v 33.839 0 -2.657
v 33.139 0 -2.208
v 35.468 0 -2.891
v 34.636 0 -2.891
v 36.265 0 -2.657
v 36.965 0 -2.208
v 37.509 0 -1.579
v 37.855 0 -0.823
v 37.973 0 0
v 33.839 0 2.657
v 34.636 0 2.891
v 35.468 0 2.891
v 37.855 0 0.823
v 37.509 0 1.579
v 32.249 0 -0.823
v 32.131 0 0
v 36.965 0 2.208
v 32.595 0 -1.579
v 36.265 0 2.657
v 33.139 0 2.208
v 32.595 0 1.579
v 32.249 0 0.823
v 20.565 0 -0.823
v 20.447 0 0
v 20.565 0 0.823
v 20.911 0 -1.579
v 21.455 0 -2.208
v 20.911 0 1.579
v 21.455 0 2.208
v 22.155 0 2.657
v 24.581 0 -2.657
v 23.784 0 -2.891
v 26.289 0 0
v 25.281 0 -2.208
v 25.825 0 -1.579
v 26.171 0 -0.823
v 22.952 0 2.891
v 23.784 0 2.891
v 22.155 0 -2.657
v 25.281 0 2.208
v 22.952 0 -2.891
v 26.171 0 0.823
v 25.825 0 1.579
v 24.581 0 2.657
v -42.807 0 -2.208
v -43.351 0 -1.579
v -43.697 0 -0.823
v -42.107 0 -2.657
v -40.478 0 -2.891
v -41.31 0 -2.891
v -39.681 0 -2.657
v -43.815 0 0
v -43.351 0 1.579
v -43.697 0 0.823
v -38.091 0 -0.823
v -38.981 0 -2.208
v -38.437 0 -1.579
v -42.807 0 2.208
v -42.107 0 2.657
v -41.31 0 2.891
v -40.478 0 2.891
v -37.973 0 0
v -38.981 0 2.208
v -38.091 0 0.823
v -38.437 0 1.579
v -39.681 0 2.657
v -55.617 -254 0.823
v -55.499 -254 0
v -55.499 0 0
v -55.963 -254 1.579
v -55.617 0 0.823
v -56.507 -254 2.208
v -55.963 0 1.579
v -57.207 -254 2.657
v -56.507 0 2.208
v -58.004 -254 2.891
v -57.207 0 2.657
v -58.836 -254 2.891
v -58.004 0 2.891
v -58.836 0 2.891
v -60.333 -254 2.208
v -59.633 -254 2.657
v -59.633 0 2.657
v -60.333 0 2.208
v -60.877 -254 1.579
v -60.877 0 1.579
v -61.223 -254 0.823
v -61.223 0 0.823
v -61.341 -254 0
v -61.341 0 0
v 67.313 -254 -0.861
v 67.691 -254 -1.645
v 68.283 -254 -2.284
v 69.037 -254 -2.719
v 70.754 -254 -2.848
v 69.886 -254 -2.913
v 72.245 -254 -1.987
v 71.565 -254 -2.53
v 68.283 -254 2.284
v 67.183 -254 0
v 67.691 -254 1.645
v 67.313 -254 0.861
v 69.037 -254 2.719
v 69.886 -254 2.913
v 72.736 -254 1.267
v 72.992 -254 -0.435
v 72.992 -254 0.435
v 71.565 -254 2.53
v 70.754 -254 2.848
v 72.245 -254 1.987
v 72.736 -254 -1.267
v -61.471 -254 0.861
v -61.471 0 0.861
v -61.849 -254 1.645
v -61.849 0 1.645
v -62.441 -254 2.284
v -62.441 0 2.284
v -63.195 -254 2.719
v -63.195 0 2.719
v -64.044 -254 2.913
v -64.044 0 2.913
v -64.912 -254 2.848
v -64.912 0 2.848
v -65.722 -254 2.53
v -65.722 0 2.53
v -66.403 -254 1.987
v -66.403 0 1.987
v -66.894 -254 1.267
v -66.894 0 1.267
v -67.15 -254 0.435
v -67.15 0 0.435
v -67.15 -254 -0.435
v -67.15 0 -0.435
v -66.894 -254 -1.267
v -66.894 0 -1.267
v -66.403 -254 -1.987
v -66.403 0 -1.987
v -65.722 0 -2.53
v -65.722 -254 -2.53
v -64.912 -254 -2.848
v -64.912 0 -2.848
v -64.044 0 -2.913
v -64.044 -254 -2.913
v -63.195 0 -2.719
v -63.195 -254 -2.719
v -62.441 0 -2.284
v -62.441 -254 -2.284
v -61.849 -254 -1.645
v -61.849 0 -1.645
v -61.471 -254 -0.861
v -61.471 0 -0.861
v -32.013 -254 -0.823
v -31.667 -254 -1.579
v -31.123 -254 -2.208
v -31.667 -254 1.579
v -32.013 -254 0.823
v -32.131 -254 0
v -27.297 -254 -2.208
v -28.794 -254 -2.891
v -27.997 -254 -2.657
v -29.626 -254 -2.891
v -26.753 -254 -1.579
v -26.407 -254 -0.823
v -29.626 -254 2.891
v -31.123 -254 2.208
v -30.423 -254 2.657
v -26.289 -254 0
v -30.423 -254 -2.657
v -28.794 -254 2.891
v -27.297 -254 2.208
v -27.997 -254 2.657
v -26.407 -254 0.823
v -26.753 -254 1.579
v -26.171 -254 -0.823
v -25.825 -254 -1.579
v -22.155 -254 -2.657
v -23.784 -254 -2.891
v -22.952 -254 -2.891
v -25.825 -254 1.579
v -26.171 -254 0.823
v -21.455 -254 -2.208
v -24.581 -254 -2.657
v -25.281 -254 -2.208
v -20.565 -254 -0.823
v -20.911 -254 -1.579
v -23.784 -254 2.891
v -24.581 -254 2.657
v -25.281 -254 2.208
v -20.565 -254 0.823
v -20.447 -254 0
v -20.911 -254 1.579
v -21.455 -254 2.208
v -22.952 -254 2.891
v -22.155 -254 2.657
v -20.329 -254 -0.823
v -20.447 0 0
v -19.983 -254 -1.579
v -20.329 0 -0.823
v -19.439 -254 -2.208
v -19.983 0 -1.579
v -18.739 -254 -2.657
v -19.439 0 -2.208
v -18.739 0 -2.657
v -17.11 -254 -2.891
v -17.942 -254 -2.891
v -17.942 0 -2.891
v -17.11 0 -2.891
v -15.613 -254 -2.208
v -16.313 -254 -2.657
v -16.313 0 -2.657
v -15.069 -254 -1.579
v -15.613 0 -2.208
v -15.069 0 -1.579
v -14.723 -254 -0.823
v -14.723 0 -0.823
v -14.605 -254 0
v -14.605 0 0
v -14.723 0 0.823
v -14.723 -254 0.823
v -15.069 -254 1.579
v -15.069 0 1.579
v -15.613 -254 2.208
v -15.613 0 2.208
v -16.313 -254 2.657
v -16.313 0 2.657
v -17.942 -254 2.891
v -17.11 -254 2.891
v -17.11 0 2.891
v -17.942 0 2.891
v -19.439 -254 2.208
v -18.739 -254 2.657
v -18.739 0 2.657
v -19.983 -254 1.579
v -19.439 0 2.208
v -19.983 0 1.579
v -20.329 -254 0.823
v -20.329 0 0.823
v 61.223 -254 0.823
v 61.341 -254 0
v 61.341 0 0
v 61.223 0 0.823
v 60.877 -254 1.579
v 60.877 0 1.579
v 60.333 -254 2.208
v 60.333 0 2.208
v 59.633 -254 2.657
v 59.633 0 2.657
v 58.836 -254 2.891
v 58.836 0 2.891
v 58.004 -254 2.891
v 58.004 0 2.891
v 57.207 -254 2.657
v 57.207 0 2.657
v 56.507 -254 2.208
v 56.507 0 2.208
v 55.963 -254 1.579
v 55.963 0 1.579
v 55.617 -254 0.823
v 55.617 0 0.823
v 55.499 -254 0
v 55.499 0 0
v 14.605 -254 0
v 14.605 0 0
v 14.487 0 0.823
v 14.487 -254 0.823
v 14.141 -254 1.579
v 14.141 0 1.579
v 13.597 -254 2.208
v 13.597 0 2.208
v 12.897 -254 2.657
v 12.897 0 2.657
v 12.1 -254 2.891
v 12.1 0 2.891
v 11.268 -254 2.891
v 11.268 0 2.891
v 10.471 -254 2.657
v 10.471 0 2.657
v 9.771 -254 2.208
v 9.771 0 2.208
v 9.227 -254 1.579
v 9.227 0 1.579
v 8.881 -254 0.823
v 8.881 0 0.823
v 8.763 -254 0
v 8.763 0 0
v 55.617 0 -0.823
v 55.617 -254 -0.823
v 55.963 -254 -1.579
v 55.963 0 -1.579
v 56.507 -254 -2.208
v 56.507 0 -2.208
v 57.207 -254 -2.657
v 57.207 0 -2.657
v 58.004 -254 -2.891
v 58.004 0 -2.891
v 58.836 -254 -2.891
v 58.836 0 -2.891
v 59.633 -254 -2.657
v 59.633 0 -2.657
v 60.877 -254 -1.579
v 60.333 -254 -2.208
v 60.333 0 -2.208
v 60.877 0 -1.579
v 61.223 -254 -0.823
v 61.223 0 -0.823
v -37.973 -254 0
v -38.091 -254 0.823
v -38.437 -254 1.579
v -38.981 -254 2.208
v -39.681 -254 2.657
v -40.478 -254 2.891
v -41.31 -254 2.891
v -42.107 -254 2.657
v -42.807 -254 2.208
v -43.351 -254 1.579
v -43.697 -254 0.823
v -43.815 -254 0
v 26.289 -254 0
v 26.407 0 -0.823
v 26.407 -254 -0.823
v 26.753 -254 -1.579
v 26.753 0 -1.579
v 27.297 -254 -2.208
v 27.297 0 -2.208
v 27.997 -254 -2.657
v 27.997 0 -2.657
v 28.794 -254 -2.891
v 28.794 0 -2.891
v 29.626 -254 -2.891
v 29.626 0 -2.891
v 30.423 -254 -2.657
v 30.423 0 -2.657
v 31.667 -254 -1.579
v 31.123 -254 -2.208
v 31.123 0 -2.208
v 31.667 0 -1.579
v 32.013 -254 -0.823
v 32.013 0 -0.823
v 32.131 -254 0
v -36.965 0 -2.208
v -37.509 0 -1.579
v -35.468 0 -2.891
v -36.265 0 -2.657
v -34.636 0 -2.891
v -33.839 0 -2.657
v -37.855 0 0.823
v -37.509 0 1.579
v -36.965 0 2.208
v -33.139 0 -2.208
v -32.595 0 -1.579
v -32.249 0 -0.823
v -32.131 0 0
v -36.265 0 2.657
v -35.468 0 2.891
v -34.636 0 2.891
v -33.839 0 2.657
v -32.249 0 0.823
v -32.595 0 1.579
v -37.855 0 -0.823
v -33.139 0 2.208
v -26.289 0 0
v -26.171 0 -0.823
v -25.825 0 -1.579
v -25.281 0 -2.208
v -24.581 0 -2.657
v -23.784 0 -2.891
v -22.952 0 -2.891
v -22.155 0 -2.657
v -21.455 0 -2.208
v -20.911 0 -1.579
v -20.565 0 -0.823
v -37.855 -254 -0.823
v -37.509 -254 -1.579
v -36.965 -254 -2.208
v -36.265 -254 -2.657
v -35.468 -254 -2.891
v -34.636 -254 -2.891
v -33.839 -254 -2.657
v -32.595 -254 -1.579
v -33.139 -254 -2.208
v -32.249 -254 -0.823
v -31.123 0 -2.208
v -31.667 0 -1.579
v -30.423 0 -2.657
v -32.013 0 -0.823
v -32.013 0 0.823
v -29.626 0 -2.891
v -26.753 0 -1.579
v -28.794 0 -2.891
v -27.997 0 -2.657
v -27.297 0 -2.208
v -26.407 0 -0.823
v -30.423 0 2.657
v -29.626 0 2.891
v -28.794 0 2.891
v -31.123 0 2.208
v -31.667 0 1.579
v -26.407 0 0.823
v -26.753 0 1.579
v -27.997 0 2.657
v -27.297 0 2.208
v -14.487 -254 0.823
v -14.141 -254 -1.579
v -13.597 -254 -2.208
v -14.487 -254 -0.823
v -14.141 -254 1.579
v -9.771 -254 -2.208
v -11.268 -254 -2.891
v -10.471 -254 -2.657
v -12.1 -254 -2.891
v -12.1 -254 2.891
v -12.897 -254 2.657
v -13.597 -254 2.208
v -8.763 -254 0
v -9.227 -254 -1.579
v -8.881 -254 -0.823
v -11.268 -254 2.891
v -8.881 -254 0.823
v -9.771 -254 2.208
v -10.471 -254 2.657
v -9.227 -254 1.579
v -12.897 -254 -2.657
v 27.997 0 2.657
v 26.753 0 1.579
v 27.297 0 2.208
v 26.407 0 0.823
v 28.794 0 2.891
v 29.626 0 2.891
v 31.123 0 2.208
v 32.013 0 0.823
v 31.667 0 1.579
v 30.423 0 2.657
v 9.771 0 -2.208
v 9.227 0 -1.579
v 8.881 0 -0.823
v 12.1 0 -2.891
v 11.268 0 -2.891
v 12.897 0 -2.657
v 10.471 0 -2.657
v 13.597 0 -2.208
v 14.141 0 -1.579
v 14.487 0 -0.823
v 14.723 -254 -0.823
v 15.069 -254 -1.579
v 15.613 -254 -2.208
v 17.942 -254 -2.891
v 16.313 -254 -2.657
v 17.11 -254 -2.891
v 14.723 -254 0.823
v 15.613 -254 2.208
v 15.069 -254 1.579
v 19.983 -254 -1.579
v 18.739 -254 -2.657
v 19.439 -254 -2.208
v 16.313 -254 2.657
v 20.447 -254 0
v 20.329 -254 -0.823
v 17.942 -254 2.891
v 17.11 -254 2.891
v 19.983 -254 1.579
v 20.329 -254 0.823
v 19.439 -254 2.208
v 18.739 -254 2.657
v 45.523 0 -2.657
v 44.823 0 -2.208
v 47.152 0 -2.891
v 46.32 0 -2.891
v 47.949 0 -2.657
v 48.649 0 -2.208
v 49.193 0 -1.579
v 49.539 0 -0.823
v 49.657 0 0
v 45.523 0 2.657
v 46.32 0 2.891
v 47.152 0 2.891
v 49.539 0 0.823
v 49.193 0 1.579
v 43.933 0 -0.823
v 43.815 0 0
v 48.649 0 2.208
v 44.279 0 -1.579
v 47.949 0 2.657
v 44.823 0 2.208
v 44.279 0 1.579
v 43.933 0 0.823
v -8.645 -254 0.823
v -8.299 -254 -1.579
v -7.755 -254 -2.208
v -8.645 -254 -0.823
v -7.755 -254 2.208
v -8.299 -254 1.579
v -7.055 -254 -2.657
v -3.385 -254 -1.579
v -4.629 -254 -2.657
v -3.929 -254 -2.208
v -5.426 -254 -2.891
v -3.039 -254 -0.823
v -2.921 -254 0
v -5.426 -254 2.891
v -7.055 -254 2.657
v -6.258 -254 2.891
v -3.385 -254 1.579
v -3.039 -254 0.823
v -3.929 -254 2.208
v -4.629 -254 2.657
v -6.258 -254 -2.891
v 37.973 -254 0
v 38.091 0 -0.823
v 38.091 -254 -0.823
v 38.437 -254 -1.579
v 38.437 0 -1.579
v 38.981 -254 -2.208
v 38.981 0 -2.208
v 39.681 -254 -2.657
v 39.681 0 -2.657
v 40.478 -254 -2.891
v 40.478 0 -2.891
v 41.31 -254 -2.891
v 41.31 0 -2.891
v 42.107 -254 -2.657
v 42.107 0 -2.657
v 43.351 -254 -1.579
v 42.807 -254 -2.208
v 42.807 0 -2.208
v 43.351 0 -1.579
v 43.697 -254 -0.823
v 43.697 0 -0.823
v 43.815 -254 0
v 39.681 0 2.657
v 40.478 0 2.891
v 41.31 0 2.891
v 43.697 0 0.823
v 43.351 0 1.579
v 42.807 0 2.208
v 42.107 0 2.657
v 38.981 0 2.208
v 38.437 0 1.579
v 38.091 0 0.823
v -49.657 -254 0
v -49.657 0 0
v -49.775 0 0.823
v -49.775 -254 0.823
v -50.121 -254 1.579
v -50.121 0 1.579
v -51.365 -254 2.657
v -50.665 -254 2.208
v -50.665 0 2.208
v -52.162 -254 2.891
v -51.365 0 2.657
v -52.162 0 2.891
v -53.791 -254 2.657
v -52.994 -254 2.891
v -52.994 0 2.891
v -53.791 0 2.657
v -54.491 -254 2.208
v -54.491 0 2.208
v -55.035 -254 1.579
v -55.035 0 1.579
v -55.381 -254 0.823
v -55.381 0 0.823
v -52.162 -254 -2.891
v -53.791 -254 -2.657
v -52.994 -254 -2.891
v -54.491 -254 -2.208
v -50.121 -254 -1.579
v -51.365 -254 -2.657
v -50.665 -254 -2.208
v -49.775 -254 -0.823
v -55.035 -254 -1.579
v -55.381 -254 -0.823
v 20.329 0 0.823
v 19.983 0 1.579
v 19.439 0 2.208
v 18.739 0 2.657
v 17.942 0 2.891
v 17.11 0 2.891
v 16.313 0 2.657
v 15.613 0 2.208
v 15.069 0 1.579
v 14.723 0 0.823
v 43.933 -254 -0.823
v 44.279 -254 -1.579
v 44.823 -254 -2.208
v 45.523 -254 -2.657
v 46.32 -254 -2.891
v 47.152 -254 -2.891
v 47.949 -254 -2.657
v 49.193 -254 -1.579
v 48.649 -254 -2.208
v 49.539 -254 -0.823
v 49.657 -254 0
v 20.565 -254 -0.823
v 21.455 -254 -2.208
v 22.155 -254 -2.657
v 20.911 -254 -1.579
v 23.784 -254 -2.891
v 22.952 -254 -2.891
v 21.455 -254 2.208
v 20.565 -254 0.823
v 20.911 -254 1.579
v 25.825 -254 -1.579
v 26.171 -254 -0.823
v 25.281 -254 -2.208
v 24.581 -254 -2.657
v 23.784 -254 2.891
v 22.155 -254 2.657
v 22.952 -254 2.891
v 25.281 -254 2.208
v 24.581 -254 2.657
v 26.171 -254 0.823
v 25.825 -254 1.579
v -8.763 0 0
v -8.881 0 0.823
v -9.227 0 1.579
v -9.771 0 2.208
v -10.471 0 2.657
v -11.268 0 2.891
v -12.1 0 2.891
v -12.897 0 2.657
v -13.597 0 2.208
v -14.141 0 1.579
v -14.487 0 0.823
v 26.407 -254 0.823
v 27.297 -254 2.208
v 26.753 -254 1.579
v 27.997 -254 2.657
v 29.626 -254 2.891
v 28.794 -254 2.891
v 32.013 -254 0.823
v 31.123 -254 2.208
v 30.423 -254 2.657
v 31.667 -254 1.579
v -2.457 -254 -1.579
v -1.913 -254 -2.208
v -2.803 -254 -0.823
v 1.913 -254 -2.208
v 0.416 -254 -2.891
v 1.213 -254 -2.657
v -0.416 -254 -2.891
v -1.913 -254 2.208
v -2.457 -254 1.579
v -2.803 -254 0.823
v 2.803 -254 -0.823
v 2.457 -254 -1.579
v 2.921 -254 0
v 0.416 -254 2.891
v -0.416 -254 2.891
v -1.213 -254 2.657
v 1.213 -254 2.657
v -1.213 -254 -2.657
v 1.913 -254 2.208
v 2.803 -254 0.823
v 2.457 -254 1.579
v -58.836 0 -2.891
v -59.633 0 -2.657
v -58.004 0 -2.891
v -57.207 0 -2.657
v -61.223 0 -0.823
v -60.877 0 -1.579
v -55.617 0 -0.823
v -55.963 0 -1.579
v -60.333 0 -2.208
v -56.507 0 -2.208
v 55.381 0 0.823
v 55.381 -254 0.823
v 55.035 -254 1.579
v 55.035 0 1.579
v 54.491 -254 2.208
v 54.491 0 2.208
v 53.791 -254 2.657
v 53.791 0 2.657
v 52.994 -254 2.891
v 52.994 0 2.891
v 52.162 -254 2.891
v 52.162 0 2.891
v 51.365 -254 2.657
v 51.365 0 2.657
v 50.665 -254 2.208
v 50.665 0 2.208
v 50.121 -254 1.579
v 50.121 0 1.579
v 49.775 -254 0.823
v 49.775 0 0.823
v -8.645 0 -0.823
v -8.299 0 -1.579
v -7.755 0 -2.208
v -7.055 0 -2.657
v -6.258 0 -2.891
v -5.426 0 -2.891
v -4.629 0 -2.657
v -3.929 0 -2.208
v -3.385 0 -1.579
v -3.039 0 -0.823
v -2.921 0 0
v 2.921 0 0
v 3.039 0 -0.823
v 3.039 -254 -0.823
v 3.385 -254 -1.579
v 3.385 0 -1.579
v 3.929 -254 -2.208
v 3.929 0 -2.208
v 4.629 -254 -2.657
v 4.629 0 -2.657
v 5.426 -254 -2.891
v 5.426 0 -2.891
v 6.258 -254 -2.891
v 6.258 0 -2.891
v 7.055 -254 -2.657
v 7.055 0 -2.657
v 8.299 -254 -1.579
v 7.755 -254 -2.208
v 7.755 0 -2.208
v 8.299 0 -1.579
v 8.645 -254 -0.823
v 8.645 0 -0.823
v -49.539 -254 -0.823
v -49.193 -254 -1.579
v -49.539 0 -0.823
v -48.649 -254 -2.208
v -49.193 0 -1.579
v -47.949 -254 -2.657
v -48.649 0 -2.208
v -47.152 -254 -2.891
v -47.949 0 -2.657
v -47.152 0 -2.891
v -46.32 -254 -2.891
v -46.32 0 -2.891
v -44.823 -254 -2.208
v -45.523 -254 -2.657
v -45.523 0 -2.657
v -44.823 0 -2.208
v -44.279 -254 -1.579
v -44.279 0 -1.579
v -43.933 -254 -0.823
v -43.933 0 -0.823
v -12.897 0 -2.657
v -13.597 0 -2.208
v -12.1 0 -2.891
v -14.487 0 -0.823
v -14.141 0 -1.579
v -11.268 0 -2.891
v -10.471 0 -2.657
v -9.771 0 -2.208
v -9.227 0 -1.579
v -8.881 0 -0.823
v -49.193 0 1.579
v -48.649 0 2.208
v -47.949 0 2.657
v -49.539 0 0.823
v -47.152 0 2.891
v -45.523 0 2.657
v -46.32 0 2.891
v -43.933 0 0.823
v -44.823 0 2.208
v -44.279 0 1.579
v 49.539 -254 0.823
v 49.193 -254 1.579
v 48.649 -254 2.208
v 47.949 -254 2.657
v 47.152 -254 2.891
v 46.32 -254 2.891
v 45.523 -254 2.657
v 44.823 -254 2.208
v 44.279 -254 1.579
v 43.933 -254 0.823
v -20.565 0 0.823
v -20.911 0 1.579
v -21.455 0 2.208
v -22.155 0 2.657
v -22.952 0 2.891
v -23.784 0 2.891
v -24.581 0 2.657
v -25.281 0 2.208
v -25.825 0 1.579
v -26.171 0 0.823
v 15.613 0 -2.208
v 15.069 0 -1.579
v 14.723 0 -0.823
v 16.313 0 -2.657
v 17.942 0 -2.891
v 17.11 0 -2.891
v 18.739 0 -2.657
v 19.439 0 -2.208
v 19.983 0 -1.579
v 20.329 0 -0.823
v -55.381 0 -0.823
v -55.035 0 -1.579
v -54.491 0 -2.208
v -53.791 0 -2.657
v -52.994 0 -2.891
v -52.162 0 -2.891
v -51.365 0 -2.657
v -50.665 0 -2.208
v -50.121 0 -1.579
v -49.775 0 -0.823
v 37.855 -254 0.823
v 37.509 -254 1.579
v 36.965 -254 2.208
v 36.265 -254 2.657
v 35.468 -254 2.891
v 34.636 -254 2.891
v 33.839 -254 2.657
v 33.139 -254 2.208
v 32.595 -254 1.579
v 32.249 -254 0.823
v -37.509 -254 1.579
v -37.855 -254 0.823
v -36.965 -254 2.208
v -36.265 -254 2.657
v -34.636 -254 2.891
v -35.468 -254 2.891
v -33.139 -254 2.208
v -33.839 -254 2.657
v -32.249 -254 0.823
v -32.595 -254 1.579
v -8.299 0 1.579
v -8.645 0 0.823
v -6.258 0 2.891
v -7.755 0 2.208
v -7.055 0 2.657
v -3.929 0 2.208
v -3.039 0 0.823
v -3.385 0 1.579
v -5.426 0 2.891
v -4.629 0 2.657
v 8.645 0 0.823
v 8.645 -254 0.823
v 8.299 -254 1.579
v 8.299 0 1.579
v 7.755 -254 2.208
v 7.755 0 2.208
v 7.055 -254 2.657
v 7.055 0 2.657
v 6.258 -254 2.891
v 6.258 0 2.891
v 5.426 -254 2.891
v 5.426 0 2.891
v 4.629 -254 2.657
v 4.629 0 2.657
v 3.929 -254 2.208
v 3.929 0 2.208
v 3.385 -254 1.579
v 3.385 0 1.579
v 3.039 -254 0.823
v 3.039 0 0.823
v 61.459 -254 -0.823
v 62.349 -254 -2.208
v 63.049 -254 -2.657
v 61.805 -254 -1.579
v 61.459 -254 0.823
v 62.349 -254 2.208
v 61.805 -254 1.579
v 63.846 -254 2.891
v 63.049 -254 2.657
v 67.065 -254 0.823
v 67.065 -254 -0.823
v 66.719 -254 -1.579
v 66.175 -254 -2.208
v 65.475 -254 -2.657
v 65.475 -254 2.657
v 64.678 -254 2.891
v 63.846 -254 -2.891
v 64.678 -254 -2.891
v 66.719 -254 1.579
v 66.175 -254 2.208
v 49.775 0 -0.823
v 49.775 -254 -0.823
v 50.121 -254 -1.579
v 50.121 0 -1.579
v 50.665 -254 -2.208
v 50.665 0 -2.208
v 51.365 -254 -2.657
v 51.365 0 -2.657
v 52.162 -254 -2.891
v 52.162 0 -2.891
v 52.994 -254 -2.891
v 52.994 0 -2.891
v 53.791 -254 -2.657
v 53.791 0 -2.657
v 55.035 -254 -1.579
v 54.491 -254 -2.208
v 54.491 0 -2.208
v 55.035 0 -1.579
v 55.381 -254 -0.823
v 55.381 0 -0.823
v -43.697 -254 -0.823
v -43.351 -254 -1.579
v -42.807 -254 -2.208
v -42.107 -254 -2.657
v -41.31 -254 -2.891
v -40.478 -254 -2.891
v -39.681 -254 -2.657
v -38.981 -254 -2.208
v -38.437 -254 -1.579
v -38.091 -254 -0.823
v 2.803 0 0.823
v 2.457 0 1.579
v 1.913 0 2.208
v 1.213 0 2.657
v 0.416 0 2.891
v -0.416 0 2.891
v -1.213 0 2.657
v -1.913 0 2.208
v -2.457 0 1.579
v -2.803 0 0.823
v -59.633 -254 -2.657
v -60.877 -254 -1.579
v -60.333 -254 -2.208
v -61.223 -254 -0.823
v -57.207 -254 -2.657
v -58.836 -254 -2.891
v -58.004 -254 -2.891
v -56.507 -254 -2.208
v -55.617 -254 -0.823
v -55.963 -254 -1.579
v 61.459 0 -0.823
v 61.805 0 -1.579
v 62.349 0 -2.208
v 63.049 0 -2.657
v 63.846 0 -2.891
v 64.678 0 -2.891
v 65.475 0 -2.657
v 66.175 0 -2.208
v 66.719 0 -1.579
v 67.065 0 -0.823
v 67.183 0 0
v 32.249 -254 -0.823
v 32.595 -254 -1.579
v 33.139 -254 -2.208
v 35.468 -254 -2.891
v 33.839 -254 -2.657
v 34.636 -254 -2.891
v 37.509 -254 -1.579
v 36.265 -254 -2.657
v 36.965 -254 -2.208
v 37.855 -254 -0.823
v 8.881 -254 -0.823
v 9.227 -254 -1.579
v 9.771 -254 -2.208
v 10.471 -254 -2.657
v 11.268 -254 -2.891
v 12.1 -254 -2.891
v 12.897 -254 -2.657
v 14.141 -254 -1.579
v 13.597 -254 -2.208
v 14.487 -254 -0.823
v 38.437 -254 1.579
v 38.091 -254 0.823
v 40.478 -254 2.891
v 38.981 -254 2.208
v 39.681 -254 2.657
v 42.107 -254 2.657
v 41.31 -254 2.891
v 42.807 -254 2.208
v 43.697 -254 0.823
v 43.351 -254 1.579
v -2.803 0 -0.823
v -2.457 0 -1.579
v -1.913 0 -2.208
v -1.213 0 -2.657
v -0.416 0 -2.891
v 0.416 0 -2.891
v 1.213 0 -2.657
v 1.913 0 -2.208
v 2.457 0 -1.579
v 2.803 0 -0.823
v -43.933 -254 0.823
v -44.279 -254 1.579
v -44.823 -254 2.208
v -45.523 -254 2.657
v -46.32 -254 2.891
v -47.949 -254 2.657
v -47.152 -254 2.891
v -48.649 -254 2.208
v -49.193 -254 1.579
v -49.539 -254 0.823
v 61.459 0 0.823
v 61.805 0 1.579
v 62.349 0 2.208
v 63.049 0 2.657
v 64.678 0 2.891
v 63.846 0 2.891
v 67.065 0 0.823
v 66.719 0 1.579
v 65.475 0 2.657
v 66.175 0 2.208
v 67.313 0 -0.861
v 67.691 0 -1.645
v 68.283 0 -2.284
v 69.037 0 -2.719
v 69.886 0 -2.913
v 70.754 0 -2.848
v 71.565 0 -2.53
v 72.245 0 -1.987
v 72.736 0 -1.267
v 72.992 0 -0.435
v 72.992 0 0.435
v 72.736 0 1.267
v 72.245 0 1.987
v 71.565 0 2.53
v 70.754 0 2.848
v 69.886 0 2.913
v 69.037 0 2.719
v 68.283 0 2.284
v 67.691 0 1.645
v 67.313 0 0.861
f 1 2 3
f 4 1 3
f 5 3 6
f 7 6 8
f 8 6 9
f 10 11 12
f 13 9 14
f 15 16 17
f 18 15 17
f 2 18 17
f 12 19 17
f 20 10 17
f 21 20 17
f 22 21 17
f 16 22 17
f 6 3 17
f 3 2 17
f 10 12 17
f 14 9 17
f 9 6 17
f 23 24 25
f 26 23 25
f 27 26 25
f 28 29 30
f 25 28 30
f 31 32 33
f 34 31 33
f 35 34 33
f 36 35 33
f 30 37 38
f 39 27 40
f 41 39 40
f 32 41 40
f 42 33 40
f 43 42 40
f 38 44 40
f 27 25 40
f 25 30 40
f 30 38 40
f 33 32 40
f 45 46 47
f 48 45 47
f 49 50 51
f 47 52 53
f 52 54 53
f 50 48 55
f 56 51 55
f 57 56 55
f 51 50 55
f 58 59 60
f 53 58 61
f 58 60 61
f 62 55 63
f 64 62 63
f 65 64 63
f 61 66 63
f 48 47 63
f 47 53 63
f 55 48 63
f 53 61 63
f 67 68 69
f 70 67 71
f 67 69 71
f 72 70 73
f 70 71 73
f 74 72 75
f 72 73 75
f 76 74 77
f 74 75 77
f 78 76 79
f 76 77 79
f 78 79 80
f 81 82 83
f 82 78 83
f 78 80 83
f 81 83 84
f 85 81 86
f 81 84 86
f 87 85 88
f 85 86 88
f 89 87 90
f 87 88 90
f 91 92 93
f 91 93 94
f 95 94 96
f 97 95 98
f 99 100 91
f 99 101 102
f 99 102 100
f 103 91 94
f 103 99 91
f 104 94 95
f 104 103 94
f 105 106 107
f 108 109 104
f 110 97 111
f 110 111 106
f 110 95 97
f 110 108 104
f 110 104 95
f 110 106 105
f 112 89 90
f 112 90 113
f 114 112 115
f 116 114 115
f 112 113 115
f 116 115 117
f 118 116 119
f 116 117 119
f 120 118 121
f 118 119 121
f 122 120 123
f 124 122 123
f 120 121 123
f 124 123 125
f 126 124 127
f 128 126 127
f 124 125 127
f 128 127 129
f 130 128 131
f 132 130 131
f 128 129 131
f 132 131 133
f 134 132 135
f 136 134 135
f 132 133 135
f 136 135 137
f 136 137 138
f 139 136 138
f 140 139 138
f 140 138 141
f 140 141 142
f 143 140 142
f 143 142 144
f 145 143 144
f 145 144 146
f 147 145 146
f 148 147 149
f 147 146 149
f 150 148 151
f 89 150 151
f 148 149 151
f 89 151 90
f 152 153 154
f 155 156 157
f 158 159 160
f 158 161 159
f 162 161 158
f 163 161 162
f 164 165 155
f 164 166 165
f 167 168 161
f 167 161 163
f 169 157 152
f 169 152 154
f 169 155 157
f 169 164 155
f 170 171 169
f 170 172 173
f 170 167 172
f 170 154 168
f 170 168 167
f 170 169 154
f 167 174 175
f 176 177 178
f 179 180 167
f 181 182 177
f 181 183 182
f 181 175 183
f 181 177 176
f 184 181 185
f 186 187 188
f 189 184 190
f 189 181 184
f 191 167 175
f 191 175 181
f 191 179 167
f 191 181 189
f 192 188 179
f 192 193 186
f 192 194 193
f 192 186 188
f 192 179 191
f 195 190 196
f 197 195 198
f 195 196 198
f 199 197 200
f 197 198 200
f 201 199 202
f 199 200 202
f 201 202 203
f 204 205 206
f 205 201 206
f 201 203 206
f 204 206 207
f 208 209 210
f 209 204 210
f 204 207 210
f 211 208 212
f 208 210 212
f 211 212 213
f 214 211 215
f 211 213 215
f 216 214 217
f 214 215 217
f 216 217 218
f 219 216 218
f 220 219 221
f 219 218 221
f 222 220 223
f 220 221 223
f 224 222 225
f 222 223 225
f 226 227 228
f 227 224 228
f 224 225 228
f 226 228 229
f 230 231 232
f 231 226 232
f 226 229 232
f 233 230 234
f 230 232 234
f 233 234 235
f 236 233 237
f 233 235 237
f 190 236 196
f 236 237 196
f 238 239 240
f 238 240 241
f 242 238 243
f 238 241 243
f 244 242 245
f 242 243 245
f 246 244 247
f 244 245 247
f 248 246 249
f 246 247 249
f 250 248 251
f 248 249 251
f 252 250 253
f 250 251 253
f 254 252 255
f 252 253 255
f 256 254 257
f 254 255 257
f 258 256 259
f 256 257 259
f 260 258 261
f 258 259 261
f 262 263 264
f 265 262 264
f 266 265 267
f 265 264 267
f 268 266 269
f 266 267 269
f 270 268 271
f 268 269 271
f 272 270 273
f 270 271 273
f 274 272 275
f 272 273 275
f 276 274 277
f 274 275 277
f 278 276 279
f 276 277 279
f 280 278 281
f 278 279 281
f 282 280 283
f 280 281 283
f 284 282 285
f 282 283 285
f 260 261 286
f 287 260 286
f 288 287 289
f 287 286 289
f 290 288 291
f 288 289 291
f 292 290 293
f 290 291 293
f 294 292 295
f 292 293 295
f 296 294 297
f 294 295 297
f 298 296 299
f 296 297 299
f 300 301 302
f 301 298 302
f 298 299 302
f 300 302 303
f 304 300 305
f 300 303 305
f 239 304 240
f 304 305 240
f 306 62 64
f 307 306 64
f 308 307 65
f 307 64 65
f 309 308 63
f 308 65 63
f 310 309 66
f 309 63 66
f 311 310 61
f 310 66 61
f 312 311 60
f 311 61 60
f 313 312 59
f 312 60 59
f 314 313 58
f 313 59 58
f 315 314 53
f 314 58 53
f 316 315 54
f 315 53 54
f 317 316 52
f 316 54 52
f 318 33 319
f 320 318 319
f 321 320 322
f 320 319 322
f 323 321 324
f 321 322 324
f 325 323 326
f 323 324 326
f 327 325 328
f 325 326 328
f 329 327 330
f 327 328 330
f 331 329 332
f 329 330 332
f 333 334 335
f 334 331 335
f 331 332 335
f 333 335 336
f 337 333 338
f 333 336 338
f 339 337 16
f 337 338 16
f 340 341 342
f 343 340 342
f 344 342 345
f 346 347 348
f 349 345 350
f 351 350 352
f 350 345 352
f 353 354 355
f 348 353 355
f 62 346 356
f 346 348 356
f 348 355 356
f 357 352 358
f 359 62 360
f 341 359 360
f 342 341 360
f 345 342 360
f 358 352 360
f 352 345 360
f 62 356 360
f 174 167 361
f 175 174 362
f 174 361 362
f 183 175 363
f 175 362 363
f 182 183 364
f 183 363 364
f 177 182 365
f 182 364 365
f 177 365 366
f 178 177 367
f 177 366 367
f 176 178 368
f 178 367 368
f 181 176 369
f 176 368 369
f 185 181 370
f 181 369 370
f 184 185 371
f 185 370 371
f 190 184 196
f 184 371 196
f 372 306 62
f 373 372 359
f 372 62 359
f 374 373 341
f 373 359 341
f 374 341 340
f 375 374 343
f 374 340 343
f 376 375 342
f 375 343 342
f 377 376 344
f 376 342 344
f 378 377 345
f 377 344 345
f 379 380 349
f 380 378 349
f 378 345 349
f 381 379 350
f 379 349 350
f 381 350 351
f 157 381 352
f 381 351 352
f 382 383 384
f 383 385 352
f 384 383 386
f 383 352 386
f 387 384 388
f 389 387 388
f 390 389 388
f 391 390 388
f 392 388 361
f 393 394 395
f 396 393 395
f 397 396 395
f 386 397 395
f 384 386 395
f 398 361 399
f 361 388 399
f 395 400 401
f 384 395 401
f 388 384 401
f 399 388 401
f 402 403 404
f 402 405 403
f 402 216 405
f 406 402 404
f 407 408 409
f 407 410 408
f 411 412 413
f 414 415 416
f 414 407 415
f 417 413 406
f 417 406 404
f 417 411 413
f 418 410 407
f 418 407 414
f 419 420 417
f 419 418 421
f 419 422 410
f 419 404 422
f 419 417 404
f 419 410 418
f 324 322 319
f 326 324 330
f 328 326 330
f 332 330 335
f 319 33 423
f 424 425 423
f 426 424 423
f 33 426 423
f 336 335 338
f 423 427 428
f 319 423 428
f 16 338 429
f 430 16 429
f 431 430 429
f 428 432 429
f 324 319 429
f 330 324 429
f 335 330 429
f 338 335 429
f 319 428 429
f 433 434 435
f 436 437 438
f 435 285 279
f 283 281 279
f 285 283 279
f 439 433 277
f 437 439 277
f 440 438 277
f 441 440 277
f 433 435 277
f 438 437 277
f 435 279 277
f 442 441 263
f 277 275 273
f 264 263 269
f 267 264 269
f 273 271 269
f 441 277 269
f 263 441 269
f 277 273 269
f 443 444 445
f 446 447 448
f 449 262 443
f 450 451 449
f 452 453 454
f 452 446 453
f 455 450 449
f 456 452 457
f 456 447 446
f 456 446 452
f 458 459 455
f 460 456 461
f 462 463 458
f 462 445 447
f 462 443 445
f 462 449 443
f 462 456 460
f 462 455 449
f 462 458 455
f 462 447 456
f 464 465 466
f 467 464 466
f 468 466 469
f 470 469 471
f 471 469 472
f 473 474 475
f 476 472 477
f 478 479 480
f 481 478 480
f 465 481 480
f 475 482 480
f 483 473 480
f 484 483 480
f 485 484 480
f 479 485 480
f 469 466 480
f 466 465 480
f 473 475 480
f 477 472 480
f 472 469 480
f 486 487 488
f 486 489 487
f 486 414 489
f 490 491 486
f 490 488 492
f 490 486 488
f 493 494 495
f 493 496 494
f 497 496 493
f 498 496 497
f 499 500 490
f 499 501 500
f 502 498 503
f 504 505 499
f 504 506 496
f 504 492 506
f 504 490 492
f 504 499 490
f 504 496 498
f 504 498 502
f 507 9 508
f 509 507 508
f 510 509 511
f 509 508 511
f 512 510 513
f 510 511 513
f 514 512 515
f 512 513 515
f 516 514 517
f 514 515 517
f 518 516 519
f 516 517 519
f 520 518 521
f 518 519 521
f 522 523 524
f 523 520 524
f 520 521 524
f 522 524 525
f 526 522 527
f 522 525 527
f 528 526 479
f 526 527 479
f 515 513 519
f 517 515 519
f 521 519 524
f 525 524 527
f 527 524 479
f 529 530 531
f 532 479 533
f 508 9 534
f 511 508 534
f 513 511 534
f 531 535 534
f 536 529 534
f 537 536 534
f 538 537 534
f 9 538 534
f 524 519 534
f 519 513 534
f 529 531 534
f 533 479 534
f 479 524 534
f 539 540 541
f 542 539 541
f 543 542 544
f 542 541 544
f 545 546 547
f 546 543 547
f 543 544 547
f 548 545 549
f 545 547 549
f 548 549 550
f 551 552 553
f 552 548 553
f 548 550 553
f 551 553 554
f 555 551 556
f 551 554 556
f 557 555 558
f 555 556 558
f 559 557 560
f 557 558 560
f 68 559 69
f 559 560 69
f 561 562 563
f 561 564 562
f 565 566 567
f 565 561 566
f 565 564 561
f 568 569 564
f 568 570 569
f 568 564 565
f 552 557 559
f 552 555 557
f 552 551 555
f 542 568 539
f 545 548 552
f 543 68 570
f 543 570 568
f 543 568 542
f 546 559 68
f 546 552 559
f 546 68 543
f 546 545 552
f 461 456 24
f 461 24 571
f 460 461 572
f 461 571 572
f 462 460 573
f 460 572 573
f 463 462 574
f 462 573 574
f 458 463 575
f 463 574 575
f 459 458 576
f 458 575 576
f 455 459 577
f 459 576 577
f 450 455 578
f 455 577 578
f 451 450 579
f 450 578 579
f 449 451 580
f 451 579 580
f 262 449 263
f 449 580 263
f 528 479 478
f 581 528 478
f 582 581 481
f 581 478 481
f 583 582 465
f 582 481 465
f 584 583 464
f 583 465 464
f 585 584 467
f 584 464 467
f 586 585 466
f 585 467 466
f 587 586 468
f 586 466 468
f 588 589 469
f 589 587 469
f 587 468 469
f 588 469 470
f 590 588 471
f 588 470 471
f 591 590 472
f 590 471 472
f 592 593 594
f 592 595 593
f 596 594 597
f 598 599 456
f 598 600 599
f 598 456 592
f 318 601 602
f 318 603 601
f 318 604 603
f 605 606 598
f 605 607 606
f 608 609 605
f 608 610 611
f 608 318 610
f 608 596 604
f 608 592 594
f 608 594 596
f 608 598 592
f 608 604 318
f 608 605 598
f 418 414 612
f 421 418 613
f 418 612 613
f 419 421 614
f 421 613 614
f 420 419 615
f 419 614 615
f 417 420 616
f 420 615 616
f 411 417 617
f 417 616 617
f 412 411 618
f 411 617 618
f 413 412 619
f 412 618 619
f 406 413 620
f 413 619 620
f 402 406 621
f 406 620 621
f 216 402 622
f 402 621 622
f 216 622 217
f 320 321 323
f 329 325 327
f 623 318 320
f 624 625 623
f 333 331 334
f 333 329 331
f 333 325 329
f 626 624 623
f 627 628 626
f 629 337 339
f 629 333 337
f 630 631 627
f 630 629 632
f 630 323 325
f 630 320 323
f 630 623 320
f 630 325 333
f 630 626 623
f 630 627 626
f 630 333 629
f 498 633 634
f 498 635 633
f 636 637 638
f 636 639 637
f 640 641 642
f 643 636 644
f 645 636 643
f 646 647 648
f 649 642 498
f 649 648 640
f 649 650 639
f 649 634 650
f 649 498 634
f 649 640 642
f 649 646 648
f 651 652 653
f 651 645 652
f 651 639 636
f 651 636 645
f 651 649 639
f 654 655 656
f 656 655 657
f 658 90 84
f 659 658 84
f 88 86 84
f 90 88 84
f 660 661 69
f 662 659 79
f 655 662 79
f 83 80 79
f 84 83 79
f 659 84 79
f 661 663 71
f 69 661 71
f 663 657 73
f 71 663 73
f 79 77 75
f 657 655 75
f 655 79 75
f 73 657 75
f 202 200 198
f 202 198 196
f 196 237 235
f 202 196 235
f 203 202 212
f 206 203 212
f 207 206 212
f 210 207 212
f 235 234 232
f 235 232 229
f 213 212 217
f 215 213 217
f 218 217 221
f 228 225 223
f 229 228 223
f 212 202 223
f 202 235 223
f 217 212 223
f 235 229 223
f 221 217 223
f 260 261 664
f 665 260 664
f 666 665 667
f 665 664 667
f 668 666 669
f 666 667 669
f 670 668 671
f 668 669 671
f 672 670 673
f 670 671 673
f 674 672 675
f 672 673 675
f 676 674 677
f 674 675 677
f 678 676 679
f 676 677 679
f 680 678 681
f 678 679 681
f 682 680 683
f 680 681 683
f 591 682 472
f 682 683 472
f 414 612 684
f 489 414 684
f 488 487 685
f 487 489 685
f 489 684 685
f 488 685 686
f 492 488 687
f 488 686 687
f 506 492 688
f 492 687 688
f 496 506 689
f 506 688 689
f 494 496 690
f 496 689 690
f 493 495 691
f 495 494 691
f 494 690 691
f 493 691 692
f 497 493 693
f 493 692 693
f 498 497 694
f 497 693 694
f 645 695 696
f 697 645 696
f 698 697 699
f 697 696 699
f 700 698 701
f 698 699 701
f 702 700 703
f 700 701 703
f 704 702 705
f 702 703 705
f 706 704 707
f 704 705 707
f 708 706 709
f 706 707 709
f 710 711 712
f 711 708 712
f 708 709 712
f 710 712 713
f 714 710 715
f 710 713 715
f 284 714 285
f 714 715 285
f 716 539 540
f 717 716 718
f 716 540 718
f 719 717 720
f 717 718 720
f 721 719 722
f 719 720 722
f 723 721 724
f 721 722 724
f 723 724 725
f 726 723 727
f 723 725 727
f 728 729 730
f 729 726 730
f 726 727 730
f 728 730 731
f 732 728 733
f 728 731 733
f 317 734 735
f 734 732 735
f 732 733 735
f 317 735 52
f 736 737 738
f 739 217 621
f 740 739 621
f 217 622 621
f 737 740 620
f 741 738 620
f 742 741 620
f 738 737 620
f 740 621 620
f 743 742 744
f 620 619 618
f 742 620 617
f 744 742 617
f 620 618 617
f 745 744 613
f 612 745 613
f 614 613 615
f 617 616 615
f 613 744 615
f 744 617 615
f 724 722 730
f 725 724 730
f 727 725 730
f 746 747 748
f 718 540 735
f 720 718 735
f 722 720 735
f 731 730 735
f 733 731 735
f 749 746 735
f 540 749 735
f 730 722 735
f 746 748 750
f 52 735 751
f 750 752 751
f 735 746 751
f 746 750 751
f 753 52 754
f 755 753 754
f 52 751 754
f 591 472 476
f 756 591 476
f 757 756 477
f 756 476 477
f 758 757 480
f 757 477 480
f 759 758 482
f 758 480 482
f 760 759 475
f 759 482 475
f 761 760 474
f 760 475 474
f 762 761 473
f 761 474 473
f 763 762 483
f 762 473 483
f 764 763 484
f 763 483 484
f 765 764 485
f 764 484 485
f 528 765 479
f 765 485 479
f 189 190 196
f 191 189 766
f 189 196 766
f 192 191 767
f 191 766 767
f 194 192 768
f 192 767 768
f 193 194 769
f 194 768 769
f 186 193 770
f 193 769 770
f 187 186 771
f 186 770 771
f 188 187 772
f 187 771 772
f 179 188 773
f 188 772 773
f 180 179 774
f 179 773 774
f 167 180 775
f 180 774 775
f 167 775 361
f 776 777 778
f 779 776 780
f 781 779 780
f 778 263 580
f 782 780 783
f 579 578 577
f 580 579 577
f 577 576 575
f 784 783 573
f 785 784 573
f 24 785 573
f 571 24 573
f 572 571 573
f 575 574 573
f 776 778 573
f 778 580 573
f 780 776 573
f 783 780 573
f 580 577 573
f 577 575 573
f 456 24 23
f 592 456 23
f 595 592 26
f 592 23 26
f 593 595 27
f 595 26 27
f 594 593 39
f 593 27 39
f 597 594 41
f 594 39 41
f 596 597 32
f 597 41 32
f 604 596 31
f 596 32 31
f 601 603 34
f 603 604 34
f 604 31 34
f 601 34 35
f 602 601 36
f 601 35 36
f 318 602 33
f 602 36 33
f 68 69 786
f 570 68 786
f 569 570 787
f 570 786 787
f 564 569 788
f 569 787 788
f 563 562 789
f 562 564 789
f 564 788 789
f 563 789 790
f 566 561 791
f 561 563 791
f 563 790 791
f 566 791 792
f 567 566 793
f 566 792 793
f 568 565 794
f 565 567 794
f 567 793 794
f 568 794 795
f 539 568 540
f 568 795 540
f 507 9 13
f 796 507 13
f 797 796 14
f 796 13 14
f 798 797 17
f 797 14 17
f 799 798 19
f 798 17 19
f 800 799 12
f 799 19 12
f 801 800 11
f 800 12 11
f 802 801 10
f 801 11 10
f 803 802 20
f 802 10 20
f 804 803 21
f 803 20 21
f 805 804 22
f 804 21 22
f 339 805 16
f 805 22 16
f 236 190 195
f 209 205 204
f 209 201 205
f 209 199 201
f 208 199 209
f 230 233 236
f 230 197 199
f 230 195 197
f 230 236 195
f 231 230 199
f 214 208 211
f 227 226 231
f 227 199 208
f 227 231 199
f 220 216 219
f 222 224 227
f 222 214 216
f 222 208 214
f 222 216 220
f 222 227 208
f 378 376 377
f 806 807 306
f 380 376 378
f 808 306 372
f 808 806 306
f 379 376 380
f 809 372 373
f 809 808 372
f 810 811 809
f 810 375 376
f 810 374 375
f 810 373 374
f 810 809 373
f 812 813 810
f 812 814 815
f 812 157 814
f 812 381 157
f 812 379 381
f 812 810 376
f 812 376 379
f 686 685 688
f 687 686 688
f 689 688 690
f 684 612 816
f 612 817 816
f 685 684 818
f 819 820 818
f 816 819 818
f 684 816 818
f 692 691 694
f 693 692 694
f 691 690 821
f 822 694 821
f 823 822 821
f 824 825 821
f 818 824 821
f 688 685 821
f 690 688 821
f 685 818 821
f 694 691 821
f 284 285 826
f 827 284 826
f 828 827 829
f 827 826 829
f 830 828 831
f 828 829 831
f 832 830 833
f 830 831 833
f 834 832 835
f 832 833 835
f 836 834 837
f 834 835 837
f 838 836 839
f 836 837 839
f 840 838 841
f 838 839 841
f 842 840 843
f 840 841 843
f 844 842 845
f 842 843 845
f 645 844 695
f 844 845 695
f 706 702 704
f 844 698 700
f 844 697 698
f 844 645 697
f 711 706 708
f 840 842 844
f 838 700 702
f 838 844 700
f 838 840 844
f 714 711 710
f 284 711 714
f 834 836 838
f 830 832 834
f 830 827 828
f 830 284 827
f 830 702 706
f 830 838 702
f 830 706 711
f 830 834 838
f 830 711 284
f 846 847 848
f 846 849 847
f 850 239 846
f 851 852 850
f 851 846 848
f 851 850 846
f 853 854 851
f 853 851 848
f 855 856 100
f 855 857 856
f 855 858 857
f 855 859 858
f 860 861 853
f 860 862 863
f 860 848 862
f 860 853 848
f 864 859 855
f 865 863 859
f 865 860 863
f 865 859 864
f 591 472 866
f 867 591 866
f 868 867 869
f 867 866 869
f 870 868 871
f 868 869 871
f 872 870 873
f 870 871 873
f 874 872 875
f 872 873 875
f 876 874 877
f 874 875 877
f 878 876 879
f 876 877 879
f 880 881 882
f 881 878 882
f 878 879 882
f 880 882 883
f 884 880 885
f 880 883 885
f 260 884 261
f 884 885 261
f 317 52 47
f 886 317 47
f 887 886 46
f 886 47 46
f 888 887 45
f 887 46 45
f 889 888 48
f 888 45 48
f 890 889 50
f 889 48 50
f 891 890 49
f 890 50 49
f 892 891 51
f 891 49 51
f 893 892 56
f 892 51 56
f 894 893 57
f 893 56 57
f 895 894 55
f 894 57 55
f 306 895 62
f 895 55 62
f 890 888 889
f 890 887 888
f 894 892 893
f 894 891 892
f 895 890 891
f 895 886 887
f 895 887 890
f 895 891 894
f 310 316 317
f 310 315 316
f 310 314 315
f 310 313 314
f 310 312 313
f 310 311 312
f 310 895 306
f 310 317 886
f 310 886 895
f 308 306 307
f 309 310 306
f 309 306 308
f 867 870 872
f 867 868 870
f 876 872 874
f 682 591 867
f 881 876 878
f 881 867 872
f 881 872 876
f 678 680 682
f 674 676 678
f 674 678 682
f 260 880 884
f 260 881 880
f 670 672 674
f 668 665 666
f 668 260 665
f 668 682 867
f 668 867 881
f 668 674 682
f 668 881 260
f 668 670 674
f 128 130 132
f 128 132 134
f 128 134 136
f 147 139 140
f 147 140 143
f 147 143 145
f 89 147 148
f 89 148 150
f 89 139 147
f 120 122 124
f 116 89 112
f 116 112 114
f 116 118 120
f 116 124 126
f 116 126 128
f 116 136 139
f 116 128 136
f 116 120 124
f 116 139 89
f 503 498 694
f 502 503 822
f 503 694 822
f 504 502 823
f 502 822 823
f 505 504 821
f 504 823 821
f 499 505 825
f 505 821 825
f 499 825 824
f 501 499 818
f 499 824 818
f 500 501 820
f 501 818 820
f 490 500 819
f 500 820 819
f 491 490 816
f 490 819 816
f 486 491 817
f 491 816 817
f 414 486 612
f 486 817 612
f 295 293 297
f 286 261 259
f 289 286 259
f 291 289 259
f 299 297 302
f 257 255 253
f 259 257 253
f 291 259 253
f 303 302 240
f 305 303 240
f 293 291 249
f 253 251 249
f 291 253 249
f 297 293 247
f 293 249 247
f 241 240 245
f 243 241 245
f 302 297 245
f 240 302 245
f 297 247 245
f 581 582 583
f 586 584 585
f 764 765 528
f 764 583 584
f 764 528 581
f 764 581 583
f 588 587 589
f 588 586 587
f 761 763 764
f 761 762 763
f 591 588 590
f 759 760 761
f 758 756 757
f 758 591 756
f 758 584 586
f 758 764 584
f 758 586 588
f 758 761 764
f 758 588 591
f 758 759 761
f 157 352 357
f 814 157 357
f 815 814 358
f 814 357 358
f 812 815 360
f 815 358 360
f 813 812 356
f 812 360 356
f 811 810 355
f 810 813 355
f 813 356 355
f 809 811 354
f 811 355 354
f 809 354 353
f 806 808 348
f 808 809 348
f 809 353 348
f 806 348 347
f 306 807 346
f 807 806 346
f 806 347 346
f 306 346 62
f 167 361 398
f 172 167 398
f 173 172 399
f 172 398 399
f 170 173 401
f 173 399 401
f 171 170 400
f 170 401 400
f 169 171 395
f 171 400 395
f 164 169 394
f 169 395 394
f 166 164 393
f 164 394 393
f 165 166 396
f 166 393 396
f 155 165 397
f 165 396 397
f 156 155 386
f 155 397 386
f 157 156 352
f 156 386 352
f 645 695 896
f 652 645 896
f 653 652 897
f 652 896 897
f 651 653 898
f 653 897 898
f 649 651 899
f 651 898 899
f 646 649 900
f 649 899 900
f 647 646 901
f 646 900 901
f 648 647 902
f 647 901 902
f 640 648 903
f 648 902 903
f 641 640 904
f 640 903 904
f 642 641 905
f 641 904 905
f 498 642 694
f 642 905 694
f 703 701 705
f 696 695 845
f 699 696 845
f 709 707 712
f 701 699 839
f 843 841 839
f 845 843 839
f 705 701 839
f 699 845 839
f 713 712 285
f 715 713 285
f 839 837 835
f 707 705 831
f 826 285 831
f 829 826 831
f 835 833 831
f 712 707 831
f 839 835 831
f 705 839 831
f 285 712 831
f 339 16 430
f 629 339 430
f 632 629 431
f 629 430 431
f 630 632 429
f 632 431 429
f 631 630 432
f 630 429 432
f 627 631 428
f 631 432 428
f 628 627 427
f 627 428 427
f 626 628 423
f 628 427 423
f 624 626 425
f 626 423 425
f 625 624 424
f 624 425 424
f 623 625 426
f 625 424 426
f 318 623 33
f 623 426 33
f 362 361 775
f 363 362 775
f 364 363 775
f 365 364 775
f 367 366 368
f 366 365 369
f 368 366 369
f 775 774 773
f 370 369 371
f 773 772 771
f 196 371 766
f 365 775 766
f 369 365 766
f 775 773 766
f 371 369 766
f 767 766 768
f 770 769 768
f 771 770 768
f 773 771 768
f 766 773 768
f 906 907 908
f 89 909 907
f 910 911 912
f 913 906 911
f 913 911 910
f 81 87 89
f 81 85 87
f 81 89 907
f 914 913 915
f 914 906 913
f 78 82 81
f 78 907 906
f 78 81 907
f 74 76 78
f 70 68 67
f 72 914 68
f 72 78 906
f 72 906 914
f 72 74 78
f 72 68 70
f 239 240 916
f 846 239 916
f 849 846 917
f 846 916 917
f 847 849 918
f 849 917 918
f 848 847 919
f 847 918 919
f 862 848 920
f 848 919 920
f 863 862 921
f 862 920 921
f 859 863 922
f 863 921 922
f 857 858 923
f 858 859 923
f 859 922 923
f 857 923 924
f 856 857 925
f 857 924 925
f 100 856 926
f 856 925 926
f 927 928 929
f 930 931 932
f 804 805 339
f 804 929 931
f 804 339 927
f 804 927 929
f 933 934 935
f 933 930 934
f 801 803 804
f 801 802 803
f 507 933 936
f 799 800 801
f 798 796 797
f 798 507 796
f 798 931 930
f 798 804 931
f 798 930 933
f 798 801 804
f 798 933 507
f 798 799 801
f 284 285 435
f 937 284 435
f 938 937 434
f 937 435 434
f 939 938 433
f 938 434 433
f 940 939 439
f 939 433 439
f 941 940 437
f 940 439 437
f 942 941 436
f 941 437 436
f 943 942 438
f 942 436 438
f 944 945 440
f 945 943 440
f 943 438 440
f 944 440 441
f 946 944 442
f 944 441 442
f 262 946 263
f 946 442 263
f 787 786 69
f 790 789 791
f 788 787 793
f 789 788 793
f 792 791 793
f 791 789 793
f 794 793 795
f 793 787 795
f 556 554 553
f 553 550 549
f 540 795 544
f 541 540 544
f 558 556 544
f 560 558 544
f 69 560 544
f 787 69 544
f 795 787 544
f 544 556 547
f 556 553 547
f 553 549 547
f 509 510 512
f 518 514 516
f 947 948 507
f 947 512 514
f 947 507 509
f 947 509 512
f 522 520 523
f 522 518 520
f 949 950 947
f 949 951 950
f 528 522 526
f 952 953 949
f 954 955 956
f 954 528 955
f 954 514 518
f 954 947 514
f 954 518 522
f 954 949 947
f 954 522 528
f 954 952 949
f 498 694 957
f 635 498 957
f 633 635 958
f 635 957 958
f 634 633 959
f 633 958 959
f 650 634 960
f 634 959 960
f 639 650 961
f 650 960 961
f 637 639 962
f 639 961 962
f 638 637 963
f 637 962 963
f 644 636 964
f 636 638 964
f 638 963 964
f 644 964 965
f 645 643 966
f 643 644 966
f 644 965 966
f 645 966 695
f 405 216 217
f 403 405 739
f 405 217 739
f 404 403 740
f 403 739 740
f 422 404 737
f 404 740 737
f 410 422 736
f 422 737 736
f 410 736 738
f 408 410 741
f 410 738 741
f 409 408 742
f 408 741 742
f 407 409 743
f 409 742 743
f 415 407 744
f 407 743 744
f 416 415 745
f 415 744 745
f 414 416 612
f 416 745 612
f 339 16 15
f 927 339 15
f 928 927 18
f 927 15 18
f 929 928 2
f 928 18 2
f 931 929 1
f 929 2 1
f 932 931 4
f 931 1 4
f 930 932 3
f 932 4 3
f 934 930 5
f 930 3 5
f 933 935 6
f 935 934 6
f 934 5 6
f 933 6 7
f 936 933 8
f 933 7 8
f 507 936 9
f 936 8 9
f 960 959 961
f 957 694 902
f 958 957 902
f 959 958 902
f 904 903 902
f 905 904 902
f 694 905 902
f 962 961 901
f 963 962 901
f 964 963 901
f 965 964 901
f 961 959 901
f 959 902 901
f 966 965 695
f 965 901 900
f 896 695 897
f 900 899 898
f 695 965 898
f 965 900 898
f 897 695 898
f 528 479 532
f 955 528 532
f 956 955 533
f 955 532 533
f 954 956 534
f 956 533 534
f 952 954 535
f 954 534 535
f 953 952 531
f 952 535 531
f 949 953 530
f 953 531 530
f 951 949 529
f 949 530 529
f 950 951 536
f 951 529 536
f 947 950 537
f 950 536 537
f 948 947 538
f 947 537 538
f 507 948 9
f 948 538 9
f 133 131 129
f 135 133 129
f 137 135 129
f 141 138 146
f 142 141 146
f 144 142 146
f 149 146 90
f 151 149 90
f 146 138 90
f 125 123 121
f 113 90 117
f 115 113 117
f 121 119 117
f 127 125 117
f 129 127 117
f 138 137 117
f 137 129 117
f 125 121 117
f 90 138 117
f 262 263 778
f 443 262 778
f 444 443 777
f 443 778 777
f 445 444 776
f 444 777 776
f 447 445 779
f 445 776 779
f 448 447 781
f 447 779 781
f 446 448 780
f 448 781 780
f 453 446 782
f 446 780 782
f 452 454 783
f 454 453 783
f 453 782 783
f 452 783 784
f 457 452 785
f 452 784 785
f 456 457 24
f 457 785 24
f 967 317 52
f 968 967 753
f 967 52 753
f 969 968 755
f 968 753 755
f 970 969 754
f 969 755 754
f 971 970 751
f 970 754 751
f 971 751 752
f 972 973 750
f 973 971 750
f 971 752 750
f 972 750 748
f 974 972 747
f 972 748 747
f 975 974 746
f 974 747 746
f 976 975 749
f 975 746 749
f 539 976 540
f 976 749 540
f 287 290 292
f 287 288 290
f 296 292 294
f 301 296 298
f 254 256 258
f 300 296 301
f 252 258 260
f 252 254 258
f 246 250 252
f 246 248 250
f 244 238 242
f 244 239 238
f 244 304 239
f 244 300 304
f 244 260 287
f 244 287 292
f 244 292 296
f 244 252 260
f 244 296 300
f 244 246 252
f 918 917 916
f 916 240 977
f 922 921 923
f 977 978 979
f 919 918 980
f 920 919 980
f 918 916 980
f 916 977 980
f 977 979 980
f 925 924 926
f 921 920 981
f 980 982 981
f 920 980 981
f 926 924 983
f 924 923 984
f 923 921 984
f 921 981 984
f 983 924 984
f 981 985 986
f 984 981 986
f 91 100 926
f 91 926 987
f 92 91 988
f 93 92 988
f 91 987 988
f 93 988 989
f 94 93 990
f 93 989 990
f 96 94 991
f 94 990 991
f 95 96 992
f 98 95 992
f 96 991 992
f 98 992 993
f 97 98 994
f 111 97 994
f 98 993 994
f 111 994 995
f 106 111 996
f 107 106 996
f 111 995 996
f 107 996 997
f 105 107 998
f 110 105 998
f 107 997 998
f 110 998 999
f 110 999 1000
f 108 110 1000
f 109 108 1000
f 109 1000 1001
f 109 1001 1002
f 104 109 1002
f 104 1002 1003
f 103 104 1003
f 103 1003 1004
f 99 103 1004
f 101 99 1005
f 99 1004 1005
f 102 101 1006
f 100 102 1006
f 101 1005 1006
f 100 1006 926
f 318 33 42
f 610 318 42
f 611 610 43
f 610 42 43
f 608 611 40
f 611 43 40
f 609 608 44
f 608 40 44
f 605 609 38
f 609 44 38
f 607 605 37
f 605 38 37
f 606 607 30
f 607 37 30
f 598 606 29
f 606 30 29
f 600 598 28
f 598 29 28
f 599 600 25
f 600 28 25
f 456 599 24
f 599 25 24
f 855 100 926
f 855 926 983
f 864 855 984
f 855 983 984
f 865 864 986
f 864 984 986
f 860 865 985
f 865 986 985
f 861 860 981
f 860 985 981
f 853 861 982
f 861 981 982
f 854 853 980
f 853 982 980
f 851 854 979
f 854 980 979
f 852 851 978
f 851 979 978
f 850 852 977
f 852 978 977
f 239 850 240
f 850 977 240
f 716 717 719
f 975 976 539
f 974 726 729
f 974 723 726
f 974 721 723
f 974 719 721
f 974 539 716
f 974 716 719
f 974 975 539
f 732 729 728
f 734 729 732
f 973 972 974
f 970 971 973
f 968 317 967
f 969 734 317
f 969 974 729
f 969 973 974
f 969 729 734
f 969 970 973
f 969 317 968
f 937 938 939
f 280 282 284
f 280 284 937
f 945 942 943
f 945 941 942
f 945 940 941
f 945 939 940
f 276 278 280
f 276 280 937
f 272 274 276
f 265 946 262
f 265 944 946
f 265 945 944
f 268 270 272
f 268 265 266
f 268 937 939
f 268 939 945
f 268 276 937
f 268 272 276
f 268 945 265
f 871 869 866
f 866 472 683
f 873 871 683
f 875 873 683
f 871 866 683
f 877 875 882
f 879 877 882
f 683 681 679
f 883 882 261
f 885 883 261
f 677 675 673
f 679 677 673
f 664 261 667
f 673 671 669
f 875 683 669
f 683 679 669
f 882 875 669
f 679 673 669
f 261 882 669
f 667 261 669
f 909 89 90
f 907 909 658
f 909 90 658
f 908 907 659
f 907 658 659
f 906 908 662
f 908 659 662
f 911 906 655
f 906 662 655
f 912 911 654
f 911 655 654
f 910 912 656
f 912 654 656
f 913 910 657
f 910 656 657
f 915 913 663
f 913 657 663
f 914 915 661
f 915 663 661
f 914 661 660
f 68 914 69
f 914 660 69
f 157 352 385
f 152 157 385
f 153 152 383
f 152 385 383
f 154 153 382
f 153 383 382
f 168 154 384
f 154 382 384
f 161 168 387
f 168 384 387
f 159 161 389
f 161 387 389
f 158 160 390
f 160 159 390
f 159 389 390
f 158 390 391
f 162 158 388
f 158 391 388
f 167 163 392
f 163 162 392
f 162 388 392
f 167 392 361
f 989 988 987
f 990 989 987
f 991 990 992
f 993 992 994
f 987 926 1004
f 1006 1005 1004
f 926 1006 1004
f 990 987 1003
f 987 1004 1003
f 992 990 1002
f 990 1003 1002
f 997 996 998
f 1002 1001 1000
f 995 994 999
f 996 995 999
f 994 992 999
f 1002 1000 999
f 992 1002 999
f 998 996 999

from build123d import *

# Parameters (mm, degrees)
F0_R     = 2.921
F1_DEPTH = 254


with BuildPart() as f1:
    # F0 (on Front) → F1 (new body)
    with BuildSketch(Plane.XZ):
        with Locations((-64.262, 0)):
            Circle(F0_R)
        with BuildLine():
            ThreePointArc((-61.341, 0), (-58.42, -2.921), (-55.499, 0))
            ThreePointArc((-55.499, 0), (-58.42, 2.921), (-61.341, 0))
        make_face()
        with BuildLine():
            ThreePointArc((-55.499, 0), (-52.578, -2.921), (-49.657, 0))
            ThreePointArc((-49.657, 0), (-52.578, 2.921), (-55.499, 0))
        make_face()
        with BuildLine():
            ThreePointArc((-49.657, 0), (-46.736, -2.921), (-43.815, 0))
            ThreePointArc((-43.815, 0), (-46.736, 2.921), (-49.657, 0))
        make_face()
        with BuildLine():
            ThreePointArc((-43.815, 0), (-40.894, -2.921), (-37.973, 0))
            ThreePointArc((-37.973, 0), (-40.894, 2.921), (-43.815, 0))
        make_face()
        with BuildLine():
            ThreePointArc((-37.973, 0), (-35.052, -2.921), (-32.131, 0))
            ThreePointArc((-32.131, 0), (-35.052, 2.921), (-37.973, 0))
        make_face()
        with BuildLine():
            ThreePointArc((-32.131, 0), (-29.21, -2.921), (-26.289, 0))
            ThreePointArc((-26.289, 0), (-29.21, 2.921), (-32.131, 0))
        make_face()
        with BuildLine():
            ThreePointArc((-26.289, 0), (-23.368, -2.921), (-20.447, 0))
            ThreePointArc((-20.447, 0), (-23.368, 2.921), (-26.289, 0))
        make_face()
        with BuildLine():
            ThreePointArc((-20.447, 0), (-17.526, -2.921), (-14.605, 0))
            ThreePointArc((-14.605, 0), (-17.526, 2.921), (-20.447, 0))
        make_face()
        with BuildLine():
            ThreePointArc((-14.605, 0), (-11.684, -2.921), (-8.763, 0))
            ThreePointArc((-8.763, 0), (-11.684, 2.921), (-14.605, 0))
        make_face()
        with BuildLine():
            ThreePointArc((-8.763, 0), (-5.842, -2.921), (-2.921, 0))
            ThreePointArc((-2.921, 0), (-5.842, 2.921), (-8.763, 0))
        make_face()
        with BuildLine():
            ThreePointArc((-2.921, 0), (0, -2.921), (2.921, 0))
            ThreePointArc((2.921, 0), (0, 2.921), (-2.921, 0))
        make_face()
        with BuildLine():
            ThreePointArc((8.763, 0), (5.842, 2.921), (2.921, 0))
            ThreePointArc((2.921, 0), (5.842, -2.921), (8.763, 0))
        make_face()
        with BuildLine():
            ThreePointArc((14.605, 0), (11.684, 2.921), (8.763, 0))
            ThreePointArc((8.763, 0), (11.684, -2.921), (14.605, 0))
        make_face()
        with BuildLine():
            ThreePointArc((20.447, 0), (17.526, 2.921), (14.605, 0))
            ThreePointArc((14.605, 0), (17.526, -2.921), (20.447, 0))
        make_face()
        with BuildLine():
            ThreePointArc((26.289, 0), (23.368, 2.921), (20.447, 0))
            ThreePointArc((20.447, 0), (23.368, -2.921), (26.289, 0))
        make_face()
        with BuildLine():
            ThreePointArc((32.131, 0), (29.21, 2.921), (26.289, 0))
            ThreePointArc((26.289, 0), (29.21, -2.921), (32.131, 0))
        make_face()
        with BuildLine():
            ThreePointArc((37.973, 0), (35.052, 2.921), (32.131, 0))
            ThreePointArc((32.131, 0), (35.052, -2.921), (37.973, 0))
        make_face()
        with BuildLine():
            ThreePointArc((43.815, 0), (40.894, 2.921), (37.973, 0))
            ThreePointArc((37.973, 0), (40.894, -2.921), (43.815, 0))
        make_face()
        with BuildLine():
            ThreePointArc((49.657, 0), (46.736, 2.921), (43.815, 0))
            ThreePointArc((43.815, 0), (46.736, -2.921), (49.657, 0))
        make_face()
        with BuildLine():
            ThreePointArc((55.499, 0), (52.578, 2.921), (49.657, 0))
            ThreePointArc((49.657, 0), (52.578, -2.921), (55.499, 0))
        make_face()
        with BuildLine():
            ThreePointArc((61.341, 0), (58.42, 2.921), (55.499, 0))
            ThreePointArc((55.499, 0), (58.42, -2.921), (61.341, 0))
        make_face()
        with BuildLine():
            ThreePointArc((67.183, 0), (64.262, 2.921), (61.341, 0))
            ThreePointArc((61.341, 0), (64.262, -2.921), (67.183, 0))
        make_face()
        with BuildLine():
            ThreePointArc((73.025, 0), (70.104, 2.921), (67.183, 0))
            ThreePointArc((67.183, 0), (70.104, -2.921), (73.025, 0))
        make_face()
    extrude(amount=F1_DEPTH)


solid = f1.part
